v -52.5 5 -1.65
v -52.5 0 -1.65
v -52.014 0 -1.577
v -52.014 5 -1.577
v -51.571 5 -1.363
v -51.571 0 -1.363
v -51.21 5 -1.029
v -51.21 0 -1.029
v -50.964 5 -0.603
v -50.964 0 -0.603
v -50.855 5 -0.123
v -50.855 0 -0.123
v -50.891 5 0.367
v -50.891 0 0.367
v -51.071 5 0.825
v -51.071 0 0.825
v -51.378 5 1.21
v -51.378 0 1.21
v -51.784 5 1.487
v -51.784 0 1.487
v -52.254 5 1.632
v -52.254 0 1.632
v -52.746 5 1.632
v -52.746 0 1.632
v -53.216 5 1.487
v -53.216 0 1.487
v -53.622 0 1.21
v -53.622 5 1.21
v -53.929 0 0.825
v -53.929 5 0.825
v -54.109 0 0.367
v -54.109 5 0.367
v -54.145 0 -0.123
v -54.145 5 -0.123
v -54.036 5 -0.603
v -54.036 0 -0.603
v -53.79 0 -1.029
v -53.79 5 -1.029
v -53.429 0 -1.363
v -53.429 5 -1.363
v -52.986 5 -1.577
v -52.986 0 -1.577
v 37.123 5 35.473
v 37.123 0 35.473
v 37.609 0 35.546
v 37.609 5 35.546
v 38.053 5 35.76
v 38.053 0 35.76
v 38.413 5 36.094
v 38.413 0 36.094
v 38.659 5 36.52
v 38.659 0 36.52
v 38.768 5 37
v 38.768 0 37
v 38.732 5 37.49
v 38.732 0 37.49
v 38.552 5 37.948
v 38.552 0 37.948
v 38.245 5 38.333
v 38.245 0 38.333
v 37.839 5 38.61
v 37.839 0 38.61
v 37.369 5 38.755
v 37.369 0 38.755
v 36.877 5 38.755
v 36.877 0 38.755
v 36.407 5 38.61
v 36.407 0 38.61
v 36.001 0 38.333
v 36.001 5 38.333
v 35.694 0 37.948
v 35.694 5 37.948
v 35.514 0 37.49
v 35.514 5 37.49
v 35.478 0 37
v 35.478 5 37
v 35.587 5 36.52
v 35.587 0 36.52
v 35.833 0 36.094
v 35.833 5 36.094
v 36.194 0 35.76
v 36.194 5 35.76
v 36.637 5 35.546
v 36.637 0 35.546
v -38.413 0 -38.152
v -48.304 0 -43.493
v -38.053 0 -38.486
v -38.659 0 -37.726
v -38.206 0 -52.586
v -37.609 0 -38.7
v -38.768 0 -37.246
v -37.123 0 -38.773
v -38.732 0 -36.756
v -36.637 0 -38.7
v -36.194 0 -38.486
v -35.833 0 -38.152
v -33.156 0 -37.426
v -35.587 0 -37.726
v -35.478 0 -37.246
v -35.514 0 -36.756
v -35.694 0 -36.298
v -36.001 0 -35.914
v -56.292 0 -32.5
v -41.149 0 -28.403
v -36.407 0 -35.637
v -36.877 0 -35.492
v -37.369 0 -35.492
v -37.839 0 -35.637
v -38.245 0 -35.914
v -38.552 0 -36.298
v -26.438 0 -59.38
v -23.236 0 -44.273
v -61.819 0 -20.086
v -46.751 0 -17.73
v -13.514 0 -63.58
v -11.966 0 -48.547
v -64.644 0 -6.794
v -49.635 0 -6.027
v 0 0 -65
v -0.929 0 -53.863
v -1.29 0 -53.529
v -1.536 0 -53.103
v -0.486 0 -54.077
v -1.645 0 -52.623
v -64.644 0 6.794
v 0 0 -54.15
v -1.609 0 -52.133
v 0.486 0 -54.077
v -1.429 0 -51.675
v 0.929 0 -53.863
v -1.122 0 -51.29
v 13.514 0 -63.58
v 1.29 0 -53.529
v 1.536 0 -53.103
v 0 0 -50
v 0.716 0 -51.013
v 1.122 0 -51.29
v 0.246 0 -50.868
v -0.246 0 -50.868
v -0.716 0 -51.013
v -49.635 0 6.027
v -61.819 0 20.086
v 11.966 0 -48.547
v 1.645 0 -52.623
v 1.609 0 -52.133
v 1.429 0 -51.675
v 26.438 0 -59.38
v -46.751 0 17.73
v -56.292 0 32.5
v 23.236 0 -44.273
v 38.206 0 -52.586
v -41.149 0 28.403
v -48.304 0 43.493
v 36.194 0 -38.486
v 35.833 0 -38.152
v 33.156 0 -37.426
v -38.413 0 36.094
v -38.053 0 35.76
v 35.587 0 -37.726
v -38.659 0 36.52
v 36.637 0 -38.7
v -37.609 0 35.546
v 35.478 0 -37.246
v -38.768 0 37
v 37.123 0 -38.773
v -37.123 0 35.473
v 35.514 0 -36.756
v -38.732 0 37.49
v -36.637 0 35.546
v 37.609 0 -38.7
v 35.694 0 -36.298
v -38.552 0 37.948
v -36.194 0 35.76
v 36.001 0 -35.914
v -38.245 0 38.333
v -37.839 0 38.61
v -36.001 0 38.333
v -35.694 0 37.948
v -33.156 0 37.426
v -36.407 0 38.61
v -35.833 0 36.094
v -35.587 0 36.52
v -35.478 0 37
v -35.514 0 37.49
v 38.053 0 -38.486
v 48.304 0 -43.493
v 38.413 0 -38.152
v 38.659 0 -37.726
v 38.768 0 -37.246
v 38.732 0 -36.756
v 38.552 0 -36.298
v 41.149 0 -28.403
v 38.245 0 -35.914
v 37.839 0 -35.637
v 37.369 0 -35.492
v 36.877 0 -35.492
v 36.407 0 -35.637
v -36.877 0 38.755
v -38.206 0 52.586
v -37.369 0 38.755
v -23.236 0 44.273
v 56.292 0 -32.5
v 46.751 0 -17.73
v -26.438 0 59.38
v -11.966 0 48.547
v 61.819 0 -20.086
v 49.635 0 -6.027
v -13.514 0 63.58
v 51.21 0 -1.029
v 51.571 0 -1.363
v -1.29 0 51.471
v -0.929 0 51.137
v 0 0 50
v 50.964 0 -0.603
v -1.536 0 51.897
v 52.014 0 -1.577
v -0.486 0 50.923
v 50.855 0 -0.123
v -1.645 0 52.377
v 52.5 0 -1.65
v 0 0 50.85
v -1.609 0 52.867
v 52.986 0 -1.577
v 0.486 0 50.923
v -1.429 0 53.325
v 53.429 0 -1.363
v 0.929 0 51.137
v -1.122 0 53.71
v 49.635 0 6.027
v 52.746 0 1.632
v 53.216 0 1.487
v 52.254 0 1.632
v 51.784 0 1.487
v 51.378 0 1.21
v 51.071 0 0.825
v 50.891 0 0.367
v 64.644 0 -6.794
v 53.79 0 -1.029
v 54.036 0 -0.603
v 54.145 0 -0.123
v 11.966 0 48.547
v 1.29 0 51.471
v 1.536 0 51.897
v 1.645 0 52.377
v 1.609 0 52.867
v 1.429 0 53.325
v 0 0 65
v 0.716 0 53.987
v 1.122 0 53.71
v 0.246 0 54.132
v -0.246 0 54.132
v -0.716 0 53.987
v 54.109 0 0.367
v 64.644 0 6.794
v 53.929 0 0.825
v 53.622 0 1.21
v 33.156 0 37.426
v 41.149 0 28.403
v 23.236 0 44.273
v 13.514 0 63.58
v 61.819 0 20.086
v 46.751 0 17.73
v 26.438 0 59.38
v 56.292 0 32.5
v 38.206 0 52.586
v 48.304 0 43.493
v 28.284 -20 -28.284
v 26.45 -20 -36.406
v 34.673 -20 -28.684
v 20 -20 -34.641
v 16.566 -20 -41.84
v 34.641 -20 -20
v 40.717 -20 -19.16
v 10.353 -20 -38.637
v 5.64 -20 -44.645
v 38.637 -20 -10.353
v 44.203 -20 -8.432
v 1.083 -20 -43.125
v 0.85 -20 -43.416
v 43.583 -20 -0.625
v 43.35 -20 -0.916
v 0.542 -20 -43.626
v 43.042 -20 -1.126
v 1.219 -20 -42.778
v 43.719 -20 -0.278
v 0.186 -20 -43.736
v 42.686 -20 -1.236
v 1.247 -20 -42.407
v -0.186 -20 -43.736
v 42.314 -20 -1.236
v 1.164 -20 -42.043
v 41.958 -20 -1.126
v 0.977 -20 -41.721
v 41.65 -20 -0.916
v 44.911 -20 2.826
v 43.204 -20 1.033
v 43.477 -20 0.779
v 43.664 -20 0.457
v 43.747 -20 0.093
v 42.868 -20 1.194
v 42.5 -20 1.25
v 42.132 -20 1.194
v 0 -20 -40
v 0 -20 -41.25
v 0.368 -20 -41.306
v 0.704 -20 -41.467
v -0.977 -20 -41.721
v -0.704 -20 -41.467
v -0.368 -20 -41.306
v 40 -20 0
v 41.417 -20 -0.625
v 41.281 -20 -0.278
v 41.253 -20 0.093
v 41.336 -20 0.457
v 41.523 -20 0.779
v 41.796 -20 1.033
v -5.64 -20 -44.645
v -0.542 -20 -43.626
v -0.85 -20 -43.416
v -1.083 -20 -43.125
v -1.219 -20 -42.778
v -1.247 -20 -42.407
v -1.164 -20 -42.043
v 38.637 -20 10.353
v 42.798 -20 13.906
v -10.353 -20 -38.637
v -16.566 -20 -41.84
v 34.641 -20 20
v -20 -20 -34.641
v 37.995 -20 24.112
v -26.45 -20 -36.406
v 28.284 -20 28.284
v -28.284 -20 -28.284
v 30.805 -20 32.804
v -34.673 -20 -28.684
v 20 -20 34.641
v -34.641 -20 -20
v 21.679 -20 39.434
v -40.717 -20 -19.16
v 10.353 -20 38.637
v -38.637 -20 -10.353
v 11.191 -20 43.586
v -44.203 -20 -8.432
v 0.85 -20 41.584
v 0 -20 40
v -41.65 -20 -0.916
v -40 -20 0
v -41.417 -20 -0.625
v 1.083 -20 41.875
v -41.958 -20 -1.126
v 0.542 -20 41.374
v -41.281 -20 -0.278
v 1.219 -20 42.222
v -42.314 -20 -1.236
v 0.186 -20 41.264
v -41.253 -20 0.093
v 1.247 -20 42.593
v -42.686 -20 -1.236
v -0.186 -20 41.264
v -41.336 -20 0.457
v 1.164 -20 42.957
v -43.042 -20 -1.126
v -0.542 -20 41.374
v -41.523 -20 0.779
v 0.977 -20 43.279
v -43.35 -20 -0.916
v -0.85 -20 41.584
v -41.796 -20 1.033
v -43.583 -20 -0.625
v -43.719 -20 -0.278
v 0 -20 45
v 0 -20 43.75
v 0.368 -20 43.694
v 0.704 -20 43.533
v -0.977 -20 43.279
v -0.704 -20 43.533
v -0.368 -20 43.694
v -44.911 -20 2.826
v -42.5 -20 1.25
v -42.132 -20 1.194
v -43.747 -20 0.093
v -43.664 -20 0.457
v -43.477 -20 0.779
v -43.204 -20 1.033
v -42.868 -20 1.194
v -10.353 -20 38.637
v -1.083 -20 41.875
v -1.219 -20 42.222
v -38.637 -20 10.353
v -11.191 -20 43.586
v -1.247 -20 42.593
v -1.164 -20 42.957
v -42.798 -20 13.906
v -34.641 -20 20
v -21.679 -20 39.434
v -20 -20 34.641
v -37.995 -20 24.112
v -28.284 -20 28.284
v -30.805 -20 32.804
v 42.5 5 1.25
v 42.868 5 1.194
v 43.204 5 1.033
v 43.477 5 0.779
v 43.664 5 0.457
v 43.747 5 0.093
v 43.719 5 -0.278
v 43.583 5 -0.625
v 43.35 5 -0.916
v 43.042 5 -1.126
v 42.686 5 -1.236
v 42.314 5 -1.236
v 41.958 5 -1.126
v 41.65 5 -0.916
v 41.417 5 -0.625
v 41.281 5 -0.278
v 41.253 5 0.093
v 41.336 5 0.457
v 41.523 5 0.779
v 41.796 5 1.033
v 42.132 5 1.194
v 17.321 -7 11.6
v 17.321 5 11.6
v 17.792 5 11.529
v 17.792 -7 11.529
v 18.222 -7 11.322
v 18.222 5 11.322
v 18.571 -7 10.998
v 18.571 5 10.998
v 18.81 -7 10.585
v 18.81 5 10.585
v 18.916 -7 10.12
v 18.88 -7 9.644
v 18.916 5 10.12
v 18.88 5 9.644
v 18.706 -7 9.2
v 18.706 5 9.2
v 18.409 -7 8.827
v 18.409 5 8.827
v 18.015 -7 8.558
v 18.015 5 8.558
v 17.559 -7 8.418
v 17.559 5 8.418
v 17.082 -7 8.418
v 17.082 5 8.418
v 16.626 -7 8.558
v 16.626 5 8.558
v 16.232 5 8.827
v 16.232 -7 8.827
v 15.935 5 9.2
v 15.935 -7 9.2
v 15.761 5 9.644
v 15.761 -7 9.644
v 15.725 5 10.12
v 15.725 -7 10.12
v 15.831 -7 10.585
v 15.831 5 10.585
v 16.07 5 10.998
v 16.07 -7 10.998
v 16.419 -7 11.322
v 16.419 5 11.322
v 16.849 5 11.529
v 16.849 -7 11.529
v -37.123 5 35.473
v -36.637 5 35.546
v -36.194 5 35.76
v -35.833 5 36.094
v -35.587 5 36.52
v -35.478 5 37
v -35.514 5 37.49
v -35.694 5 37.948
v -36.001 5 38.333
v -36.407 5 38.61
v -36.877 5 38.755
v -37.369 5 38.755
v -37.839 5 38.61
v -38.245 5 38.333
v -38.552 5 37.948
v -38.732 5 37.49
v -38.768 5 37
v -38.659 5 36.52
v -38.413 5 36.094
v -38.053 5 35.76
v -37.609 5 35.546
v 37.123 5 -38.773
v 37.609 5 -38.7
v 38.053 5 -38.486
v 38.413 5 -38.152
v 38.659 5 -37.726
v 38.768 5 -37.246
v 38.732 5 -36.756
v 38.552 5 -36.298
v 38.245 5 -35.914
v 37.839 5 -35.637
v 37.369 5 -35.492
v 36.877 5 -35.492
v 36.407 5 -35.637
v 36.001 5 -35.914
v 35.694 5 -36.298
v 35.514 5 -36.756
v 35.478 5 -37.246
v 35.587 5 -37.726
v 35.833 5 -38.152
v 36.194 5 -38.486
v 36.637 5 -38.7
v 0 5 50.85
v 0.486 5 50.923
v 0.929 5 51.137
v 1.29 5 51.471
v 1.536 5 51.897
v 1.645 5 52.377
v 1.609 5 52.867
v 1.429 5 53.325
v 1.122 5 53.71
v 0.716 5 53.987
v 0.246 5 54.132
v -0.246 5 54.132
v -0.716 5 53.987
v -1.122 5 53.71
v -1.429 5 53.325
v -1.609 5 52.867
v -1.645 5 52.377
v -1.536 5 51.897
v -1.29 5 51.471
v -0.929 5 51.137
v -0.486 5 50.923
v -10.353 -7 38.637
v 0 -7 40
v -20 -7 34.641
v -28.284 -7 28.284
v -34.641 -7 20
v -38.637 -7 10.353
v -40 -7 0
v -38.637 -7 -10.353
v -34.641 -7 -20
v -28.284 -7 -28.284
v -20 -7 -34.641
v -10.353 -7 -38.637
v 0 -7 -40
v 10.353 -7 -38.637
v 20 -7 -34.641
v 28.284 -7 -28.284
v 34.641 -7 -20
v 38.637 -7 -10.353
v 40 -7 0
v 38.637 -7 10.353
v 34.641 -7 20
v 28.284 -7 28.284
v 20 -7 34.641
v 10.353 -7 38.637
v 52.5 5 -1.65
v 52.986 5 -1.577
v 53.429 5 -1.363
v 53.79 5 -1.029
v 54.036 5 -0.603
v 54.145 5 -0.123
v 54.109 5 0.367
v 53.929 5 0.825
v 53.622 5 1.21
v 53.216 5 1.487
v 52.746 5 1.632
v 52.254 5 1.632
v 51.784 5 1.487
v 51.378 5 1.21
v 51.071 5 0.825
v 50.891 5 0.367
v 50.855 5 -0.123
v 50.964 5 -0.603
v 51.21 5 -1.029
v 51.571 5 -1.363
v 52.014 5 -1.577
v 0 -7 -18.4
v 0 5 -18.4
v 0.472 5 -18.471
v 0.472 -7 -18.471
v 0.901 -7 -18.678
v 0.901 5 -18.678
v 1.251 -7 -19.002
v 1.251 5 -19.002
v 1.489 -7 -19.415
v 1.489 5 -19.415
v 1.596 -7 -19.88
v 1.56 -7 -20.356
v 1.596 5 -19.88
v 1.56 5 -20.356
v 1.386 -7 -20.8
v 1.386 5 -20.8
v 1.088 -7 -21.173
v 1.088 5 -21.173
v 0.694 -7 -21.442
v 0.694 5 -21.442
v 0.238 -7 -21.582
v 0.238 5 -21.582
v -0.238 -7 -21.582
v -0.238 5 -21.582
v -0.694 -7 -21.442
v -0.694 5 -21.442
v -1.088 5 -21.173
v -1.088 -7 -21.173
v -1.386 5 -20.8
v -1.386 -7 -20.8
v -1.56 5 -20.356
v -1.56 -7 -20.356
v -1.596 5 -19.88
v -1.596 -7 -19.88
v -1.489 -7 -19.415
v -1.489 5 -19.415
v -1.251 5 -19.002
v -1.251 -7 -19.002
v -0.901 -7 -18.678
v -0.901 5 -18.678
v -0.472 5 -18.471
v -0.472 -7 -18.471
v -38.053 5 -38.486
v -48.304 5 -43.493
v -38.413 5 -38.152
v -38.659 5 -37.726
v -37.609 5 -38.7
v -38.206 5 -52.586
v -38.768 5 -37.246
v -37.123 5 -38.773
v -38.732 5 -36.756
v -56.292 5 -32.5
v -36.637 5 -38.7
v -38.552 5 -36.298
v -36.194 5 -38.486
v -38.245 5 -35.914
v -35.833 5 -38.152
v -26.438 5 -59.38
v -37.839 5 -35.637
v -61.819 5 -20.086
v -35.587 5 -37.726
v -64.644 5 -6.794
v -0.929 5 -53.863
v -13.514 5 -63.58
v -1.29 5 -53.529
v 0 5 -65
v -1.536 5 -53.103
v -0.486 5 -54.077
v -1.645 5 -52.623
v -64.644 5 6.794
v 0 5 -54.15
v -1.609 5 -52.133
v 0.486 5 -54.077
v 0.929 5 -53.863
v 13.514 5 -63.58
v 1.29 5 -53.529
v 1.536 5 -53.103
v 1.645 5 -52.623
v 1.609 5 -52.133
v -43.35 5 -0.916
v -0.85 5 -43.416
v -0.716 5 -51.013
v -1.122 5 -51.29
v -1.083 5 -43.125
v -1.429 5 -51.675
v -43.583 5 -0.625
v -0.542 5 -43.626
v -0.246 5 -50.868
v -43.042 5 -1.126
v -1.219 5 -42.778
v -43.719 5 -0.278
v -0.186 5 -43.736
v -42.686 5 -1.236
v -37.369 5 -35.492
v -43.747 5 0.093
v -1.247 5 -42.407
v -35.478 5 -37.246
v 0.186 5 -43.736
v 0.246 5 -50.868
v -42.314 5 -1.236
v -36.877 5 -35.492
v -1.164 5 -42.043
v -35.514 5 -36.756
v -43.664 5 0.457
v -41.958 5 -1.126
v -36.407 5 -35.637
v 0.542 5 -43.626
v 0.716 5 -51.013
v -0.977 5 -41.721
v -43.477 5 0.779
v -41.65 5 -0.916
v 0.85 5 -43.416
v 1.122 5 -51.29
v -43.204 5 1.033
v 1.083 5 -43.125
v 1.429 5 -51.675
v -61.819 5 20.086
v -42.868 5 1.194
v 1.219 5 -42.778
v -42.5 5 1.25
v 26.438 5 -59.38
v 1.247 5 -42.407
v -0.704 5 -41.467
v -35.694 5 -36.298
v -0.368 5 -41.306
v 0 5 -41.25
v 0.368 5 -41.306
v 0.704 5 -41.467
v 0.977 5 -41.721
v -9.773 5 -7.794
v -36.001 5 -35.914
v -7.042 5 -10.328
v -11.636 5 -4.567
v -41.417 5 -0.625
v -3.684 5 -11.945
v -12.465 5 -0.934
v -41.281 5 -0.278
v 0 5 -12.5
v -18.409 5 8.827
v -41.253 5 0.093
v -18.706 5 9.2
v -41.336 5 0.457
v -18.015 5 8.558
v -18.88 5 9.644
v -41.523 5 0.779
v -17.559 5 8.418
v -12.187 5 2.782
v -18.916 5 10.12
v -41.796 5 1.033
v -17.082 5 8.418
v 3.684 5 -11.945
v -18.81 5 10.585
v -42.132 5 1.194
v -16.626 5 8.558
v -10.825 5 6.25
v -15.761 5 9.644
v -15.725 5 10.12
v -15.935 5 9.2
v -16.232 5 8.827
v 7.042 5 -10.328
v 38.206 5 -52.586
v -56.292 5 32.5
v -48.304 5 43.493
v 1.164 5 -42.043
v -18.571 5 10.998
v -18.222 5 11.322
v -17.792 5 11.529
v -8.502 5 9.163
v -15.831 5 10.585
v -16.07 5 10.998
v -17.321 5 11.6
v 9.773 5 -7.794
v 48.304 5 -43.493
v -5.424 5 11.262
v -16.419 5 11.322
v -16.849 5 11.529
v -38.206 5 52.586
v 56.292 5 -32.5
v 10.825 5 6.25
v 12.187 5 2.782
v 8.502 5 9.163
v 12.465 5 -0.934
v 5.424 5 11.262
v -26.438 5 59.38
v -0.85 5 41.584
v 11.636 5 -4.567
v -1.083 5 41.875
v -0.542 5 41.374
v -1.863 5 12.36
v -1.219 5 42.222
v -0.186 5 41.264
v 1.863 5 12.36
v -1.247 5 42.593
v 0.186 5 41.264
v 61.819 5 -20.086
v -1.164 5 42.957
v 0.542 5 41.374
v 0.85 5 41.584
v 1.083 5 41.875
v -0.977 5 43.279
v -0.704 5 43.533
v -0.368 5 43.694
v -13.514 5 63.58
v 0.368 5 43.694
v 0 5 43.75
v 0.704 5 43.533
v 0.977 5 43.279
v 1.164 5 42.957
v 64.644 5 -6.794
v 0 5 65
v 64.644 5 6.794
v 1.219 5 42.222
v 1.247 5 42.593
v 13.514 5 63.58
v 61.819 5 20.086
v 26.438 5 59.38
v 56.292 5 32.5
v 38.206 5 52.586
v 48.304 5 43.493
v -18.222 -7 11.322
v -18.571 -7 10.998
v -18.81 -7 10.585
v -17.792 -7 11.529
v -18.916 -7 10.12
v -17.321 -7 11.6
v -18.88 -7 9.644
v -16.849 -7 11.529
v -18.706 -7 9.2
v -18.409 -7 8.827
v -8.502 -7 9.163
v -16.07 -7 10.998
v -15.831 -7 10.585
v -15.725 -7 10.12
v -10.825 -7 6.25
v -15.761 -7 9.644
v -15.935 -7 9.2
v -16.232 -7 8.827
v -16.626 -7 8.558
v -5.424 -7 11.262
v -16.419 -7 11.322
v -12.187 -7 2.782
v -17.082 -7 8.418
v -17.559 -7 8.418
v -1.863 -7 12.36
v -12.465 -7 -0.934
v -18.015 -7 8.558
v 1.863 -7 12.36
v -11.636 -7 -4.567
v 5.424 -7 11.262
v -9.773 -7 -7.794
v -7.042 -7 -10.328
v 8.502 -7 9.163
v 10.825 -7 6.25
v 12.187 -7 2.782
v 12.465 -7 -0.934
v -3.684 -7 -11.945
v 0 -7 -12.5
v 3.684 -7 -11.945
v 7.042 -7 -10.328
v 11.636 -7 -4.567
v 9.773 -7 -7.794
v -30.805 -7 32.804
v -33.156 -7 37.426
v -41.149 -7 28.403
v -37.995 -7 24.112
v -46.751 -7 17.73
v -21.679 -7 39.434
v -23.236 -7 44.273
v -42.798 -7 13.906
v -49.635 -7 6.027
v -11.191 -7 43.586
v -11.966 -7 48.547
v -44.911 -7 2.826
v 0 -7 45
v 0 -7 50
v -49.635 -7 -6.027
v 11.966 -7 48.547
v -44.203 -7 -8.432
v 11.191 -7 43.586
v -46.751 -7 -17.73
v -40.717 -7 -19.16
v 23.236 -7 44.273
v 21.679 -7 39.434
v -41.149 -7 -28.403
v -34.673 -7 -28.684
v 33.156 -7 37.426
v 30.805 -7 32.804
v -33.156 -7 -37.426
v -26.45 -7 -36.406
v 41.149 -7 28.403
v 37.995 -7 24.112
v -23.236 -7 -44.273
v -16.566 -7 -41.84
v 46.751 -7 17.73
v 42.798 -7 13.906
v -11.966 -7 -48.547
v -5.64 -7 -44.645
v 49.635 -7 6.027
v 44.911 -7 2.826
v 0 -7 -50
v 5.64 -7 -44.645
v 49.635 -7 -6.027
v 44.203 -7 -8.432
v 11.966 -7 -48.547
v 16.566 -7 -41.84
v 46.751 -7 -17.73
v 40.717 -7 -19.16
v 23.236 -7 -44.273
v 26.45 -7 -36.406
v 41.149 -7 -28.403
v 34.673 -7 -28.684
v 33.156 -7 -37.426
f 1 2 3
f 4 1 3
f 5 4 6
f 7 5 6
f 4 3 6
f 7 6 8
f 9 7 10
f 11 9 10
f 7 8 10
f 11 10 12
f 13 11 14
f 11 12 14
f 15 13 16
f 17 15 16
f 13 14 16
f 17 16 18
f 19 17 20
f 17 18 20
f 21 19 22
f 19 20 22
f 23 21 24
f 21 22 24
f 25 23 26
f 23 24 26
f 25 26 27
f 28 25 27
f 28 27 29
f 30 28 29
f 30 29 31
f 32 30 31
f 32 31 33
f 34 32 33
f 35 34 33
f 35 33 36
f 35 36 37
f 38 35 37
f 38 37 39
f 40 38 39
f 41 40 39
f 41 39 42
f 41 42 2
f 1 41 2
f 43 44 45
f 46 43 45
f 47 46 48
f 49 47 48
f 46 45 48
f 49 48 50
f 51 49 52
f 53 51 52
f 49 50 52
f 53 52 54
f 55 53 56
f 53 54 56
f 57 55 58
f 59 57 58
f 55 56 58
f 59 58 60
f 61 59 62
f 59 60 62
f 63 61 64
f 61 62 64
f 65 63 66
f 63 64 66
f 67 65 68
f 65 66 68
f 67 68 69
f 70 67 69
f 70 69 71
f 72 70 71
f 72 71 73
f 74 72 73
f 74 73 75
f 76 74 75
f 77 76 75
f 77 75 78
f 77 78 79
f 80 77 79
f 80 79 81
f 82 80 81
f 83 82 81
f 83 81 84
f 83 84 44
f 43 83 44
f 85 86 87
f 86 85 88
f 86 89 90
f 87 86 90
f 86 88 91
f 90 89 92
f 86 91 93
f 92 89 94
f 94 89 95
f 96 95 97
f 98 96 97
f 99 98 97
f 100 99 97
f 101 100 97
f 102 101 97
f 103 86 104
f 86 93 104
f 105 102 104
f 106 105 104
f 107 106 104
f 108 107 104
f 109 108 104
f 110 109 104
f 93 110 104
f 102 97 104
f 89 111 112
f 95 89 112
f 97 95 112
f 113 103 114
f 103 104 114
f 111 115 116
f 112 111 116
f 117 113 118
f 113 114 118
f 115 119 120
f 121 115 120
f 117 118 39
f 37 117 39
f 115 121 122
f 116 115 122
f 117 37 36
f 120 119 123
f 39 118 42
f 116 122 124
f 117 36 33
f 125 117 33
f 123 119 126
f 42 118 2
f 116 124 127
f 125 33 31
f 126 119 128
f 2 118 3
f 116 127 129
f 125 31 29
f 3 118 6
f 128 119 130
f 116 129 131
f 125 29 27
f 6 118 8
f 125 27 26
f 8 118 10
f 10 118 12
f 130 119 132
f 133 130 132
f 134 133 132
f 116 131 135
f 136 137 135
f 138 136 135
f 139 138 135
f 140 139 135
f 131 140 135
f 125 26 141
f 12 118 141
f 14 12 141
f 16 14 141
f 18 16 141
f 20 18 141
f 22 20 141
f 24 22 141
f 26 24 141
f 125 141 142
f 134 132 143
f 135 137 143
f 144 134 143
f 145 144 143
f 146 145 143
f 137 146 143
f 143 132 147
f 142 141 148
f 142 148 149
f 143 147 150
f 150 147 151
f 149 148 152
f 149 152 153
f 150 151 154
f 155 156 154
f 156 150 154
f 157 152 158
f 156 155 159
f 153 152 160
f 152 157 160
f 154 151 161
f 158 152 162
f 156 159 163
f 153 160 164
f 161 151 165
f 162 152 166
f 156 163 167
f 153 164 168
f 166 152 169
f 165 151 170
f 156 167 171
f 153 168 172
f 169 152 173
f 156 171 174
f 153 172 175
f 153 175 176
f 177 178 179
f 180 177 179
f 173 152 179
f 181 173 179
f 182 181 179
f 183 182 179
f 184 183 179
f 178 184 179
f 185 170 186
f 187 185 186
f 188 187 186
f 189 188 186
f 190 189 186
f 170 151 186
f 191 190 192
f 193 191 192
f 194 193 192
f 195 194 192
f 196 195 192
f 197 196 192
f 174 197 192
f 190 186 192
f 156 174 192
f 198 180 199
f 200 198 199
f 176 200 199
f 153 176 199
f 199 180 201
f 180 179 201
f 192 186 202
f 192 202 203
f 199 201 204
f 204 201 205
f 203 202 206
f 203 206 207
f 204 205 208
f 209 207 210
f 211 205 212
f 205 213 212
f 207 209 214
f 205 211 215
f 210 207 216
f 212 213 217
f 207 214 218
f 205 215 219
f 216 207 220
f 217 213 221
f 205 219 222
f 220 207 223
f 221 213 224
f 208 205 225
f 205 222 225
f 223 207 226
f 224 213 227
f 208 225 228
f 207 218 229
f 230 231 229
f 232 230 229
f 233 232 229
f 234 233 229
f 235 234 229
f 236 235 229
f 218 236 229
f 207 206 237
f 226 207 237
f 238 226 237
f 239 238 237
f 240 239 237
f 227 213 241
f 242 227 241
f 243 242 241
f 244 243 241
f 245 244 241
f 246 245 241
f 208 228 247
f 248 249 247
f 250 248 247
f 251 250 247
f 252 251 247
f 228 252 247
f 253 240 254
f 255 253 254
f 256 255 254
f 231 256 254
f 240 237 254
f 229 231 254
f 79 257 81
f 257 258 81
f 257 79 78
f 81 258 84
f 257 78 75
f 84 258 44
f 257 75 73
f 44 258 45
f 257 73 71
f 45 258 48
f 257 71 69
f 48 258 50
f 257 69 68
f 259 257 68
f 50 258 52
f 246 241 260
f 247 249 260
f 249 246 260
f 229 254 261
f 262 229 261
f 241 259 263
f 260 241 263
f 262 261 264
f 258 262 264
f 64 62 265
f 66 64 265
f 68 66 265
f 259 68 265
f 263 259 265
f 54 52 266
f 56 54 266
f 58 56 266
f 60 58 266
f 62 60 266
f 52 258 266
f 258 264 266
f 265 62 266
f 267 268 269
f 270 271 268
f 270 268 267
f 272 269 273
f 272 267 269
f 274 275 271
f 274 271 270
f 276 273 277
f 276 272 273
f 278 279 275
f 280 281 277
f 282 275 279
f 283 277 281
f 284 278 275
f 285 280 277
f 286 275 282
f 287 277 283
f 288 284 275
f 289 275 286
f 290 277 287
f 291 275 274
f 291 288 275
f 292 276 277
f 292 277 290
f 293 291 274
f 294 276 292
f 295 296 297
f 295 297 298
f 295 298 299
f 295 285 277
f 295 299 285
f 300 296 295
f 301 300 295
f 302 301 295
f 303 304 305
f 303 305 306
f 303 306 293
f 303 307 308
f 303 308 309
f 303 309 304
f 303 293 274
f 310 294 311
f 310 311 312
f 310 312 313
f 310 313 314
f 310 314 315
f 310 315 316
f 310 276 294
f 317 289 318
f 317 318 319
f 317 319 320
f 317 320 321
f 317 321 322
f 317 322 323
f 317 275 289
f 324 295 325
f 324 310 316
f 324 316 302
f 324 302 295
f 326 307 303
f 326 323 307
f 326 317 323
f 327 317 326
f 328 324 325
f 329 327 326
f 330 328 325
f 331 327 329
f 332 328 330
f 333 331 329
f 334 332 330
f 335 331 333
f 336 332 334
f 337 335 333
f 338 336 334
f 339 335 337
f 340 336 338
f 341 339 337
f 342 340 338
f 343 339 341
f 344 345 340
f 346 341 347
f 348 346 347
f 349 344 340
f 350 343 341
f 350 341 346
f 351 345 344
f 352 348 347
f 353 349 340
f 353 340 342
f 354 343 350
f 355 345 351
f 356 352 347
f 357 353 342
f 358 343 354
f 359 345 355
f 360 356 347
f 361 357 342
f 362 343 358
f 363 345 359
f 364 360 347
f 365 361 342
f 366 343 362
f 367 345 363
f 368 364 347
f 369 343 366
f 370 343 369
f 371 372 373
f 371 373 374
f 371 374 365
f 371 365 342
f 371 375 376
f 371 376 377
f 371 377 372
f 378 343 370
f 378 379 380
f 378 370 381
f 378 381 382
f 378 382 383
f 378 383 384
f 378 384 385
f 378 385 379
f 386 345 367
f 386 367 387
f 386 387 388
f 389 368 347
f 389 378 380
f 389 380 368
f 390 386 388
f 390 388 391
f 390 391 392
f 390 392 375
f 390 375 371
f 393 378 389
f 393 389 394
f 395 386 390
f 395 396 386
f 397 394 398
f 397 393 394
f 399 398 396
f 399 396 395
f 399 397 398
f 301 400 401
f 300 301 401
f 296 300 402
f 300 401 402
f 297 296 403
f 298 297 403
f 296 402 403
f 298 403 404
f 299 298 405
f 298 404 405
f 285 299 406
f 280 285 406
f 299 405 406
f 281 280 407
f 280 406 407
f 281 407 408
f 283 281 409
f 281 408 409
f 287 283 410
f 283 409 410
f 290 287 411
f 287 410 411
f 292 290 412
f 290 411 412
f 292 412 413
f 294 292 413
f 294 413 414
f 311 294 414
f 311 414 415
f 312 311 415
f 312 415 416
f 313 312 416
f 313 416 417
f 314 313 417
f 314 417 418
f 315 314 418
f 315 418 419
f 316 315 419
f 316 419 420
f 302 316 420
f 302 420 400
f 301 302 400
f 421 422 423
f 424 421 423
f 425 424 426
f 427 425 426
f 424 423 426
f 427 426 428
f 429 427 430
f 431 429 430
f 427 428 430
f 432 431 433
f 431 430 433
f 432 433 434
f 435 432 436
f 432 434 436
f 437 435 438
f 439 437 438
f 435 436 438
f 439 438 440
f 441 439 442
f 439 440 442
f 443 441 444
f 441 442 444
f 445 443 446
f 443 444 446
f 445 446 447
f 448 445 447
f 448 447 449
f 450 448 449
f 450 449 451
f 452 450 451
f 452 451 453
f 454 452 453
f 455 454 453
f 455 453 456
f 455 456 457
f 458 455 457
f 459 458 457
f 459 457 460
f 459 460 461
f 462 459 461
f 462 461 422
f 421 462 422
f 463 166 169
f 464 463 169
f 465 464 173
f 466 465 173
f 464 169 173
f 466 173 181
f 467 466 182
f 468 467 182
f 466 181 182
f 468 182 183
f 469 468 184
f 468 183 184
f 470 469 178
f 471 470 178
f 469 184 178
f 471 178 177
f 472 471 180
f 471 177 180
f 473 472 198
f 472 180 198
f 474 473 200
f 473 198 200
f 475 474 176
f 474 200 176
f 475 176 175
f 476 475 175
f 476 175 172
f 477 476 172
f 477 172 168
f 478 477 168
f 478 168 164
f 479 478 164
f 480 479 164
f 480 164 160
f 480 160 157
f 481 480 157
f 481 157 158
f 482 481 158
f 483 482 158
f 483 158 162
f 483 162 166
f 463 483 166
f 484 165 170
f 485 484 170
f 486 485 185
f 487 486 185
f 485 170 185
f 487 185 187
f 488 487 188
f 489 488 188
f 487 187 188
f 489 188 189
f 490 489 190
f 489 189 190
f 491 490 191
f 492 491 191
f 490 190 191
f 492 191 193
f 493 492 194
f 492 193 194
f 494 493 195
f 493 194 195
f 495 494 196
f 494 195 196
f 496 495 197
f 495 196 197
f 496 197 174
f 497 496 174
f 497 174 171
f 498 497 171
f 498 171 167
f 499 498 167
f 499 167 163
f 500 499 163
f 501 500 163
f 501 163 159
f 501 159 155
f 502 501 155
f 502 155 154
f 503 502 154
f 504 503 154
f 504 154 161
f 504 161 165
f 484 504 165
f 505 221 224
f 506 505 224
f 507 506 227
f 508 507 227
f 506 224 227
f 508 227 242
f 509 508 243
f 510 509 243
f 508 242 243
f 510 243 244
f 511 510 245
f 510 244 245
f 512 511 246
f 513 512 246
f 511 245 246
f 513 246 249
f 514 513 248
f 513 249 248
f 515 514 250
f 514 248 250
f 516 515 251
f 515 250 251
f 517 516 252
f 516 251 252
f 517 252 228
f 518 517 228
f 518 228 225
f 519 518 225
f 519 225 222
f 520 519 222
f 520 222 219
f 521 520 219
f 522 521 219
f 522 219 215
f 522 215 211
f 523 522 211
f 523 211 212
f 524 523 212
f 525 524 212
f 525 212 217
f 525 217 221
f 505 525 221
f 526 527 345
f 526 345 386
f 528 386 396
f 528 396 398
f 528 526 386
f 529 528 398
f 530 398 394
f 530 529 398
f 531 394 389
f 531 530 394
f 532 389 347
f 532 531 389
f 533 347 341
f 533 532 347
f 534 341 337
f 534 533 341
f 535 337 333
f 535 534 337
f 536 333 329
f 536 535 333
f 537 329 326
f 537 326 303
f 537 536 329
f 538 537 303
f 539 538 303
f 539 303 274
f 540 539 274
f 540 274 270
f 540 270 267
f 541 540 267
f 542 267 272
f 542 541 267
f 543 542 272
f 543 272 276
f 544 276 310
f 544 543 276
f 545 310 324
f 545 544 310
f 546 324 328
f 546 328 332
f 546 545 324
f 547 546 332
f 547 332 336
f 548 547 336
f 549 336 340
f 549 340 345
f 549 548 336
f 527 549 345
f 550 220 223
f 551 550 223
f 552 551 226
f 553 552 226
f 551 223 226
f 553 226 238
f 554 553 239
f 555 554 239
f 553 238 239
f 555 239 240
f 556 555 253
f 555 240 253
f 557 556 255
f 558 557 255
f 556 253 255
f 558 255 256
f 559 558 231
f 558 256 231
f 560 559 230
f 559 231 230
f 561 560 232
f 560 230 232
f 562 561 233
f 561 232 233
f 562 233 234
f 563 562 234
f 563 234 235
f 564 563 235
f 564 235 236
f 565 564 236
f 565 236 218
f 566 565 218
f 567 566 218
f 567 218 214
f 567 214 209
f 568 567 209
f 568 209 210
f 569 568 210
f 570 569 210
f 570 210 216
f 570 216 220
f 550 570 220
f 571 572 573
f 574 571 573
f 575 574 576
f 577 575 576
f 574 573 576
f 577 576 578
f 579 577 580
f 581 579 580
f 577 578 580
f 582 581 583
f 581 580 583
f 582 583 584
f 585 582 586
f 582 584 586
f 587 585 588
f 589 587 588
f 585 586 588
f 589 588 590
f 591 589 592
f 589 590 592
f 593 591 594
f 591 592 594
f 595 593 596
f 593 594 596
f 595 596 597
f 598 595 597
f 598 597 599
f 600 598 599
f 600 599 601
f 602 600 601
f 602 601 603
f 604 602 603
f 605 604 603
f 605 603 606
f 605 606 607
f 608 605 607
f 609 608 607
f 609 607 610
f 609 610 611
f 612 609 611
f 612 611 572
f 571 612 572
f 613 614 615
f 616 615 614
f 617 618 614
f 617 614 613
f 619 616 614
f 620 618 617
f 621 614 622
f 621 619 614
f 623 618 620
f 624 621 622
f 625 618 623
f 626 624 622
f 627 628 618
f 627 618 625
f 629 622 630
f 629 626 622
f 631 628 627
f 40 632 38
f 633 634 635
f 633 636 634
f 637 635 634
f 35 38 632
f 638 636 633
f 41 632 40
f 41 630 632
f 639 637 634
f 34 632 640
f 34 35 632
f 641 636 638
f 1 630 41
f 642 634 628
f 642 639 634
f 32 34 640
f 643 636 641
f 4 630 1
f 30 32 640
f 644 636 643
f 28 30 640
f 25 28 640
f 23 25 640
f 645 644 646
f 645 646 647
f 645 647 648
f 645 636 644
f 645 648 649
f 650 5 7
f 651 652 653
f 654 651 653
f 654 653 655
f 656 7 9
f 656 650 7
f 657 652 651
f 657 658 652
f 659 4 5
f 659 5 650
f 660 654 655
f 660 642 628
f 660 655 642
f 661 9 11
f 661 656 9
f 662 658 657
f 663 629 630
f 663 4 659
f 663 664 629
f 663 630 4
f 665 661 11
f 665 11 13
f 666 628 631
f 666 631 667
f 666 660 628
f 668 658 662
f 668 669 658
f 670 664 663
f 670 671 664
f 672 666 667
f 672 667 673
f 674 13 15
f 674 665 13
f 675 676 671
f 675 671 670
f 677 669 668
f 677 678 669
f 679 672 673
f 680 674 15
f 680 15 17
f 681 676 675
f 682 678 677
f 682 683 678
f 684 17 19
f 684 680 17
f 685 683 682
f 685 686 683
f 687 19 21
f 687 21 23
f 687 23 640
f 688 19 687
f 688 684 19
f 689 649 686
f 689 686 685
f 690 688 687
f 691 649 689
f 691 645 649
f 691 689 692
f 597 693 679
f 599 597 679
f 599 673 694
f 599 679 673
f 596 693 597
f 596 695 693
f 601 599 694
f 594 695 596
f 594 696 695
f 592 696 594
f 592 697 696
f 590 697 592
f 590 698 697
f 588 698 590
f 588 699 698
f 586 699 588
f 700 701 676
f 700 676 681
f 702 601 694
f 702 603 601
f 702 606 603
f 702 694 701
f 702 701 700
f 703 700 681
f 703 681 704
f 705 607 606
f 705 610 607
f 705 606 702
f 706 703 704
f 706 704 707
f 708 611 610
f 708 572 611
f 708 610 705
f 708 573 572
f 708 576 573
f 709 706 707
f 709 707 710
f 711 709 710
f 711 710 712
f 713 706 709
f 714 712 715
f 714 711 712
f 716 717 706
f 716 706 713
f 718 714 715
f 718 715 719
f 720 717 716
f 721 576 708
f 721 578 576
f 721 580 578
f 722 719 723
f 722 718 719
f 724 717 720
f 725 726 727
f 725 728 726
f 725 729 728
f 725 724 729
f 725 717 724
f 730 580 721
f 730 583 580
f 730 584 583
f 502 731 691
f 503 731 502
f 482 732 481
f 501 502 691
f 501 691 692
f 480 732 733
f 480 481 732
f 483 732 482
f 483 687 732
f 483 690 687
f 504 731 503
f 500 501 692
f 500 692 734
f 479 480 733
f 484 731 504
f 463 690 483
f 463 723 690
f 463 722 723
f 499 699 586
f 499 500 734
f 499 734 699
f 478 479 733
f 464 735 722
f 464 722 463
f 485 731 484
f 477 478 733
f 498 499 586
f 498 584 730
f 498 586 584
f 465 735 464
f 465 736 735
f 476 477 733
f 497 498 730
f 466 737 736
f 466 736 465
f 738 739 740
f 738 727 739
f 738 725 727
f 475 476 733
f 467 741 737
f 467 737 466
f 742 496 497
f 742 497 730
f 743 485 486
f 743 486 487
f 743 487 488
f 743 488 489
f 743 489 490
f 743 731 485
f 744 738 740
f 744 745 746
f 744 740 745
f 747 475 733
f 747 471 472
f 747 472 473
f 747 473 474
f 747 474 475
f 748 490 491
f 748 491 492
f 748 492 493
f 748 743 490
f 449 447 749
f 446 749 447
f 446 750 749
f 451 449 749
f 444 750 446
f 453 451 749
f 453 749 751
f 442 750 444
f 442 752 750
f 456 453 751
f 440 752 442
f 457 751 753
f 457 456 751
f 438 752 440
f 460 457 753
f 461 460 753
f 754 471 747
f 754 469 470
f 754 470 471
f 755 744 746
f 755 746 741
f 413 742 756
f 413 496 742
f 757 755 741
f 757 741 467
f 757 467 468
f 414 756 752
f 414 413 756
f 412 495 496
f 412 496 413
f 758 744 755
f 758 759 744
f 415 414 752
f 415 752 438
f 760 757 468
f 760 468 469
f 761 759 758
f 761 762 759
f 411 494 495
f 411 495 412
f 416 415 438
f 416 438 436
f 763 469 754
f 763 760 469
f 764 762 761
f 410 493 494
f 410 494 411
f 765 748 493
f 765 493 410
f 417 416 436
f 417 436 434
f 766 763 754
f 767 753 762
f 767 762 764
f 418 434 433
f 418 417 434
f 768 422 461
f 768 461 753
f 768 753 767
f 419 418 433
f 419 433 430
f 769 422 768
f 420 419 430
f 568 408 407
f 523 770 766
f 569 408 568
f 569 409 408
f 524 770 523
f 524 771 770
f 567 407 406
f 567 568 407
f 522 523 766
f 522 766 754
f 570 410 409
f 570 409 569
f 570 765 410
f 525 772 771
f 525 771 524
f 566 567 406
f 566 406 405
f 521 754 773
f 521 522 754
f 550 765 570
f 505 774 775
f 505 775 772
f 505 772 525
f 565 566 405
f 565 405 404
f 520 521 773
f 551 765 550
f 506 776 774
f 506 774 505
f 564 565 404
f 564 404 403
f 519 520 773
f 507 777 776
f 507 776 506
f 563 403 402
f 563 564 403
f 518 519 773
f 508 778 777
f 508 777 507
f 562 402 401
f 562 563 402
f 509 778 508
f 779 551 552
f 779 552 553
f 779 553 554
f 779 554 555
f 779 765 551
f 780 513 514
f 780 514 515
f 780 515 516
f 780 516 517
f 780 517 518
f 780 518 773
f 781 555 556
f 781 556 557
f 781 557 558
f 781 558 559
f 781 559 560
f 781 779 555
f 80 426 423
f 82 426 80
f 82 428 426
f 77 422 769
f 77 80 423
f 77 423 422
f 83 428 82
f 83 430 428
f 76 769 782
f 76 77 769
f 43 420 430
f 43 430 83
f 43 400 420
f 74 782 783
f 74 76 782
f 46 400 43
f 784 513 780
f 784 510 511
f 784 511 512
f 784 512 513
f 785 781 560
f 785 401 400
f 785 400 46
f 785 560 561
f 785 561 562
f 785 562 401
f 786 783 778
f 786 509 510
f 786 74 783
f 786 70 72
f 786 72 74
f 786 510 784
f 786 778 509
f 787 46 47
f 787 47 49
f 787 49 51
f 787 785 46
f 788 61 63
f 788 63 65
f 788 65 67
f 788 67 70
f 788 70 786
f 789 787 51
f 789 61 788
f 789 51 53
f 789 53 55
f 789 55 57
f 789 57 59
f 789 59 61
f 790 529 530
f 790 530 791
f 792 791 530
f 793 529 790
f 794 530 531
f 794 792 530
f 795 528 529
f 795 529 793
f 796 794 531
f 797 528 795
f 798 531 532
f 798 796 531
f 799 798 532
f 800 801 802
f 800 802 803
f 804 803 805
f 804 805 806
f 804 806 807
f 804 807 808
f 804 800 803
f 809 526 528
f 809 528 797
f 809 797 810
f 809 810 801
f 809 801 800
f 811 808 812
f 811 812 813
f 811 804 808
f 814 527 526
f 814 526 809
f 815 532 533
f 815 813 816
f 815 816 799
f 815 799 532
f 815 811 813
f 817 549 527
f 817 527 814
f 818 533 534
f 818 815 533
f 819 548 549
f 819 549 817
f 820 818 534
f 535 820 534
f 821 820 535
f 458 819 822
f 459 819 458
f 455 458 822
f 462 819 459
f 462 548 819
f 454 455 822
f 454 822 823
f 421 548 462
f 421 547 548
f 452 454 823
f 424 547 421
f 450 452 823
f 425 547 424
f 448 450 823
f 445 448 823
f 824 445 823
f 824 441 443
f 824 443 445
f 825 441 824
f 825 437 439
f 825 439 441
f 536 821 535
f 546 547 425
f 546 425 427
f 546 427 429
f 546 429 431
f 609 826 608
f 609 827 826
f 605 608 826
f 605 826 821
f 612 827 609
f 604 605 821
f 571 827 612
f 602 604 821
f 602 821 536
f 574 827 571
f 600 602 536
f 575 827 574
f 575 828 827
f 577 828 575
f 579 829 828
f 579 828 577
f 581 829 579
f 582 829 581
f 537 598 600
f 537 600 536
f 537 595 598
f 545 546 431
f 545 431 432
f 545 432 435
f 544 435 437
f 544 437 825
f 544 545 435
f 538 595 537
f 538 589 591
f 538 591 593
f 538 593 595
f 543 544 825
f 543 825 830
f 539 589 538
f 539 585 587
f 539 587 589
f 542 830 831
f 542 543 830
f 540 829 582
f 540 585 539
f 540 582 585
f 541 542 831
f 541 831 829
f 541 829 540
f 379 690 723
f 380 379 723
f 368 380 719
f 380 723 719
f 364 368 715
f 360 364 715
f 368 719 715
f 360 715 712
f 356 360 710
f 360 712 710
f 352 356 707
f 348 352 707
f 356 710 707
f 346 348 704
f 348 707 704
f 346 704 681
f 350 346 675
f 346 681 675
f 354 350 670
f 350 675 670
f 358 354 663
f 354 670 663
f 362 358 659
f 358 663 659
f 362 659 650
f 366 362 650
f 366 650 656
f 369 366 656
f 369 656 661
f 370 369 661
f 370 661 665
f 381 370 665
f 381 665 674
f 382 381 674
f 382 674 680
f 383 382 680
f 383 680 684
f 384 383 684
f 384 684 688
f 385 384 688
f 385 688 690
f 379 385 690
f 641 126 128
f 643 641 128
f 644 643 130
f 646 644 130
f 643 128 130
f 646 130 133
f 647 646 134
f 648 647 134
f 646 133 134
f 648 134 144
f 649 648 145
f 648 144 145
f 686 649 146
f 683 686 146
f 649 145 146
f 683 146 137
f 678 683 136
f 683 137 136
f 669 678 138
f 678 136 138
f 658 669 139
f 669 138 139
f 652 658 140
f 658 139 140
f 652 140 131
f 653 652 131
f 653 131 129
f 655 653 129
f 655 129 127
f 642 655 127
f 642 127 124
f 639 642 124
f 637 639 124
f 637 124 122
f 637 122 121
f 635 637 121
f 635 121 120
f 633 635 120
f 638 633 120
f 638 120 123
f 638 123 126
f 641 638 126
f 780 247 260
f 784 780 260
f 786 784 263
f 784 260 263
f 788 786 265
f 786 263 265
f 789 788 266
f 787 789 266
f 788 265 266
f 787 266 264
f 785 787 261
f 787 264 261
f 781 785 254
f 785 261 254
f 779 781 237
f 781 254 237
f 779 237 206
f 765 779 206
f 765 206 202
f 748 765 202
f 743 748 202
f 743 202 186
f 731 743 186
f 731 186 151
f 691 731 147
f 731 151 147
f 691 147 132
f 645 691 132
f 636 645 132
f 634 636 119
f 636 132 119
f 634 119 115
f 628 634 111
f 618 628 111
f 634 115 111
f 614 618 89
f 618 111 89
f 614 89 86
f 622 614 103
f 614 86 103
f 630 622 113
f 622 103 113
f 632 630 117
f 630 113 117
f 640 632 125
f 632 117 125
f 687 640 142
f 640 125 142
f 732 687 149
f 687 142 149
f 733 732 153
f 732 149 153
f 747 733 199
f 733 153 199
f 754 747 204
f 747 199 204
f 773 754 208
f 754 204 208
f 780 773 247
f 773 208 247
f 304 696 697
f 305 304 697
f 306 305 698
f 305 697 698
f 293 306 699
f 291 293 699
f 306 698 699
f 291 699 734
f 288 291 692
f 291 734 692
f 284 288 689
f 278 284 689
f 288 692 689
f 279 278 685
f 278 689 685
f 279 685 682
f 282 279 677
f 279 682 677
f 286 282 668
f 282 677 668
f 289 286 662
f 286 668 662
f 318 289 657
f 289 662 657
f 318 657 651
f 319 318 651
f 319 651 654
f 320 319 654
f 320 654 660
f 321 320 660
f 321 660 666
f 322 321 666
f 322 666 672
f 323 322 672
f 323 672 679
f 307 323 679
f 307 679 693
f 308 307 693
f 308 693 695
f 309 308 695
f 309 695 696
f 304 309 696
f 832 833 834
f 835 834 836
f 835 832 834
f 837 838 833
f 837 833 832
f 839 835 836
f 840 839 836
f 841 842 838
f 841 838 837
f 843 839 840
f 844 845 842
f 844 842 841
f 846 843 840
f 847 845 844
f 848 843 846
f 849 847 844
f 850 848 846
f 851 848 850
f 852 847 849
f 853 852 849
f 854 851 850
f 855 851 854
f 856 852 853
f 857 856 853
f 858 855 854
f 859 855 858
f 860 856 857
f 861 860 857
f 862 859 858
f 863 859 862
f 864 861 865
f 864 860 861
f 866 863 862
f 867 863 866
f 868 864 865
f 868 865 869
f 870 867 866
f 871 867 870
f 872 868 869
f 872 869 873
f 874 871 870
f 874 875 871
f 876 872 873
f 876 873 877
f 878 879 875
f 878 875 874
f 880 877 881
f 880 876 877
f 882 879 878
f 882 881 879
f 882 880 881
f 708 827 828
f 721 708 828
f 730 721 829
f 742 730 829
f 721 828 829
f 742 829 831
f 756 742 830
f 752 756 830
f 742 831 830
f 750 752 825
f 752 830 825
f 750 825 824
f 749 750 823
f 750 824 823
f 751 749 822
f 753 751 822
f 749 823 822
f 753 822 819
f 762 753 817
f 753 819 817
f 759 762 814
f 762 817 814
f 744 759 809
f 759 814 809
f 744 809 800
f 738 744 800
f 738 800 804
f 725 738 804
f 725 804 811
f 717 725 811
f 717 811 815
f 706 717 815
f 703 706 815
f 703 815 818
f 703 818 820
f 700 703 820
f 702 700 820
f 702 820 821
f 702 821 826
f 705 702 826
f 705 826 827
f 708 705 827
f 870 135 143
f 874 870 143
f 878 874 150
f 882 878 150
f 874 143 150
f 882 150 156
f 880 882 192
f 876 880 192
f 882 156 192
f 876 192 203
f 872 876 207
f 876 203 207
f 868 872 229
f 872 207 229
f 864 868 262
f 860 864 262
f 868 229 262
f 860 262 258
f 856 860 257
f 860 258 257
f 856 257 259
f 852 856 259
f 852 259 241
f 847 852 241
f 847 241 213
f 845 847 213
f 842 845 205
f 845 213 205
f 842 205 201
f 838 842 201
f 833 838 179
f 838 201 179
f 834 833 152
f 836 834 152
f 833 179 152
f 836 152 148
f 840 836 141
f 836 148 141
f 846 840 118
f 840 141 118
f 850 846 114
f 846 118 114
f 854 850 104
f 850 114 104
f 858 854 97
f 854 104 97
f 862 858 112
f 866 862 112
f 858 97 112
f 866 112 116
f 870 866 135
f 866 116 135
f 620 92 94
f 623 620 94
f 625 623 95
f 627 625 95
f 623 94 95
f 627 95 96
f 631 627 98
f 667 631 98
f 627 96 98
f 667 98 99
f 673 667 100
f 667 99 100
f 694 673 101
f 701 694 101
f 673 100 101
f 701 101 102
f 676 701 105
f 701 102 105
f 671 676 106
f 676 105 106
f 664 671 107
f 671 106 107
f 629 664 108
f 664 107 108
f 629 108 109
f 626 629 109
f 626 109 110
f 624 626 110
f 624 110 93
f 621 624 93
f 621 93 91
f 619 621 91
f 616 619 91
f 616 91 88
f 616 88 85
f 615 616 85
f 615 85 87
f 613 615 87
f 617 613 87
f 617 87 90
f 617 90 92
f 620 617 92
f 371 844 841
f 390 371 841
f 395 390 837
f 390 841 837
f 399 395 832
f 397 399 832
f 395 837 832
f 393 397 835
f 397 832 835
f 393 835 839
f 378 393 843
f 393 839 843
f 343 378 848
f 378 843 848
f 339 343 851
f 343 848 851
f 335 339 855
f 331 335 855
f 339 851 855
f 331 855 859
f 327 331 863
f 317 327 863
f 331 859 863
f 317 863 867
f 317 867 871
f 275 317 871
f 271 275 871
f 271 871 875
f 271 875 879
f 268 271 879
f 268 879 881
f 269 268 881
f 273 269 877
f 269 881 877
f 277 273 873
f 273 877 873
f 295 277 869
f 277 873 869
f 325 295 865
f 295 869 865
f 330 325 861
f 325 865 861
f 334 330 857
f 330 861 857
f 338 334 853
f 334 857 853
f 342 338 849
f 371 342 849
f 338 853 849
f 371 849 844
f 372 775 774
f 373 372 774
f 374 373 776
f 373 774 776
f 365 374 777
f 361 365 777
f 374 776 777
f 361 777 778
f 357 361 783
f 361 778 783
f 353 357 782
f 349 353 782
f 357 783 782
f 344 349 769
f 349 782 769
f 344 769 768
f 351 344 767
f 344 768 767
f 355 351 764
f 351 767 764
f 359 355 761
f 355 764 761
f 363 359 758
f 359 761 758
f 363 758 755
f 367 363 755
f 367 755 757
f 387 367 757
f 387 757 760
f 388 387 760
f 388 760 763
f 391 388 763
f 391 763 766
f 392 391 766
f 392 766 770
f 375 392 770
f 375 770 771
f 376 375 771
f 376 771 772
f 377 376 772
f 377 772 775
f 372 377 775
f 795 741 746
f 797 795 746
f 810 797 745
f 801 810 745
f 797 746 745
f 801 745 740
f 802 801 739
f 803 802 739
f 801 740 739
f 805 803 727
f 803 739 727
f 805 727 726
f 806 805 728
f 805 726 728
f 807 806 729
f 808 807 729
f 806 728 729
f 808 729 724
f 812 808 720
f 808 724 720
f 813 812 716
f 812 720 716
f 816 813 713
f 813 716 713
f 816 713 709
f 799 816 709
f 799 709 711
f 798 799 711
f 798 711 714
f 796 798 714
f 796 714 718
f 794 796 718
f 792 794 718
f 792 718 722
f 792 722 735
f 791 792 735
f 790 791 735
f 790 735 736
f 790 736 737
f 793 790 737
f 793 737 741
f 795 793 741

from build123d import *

# Parameters (mm, degrees)
SKETCH_1_R             = 65
EXTRUDE_1_DEPTH        = 5
SKETCH_2_R             = 50
EXTRUDE_2_DEPTH        = 7
SKETCH_3_R             = 1.6
CUT_EXTRUDE_1_DEPTH    = 58
SKETCH_4_R             = 12.5
CUT_EXTRUDE_2_DEPTH    = 93.703829479
SKETCH_5_R             = 45
SKETCH_5_R_2           = 40
EXTRUDE_3_DEPTH        = 13
HOLE_WIZARD_M3_1_D     = 2.5
SKETCH_9_R             = 1.6
CUT_EXTRUDE_3_DEPTH    = 10
HOLE_WIZARD_M4_3_D     = 3.3
HOLE_WIZARD_M4_3_DEPTH = 9.5
HOLE_WIZARD_M4_3_TIP   = 0.991420021


with BuildPart() as part:
    # 草图1 → 凸台-拉伸1 (new body)
    with BuildSketch(Plane(origin=(0, 0, 0), x_dir=(1, 0, 0), z_dir=(0, 1, 0))):
        with Locations(Location((0, 0, 0), (0, 0, 270))):
            Circle(SKETCH_1_R)
    extrude(amount=EXTRUDE_1_DEPTH)

    # 草图2 → 凸台-拉伸2 (add)
    with BuildSketch(Plane(origin=(0, 0, 0), x_dir=(-1, 0, 0), z_dir=(0, -1, 0))):
        with Locations(Location((0, 0, 0), (0, 0, 90))):
            Circle(SKETCH_2_R)
    extrude(amount=EXTRUDE_2_DEPTH)

    # 草图3 → 切除-拉伸1 (cut)
    with BuildSketch(Plane(origin=(0, 5, 0), x_dir=(1, 0, 0), z_dir=(0, 1, 0))):
        with Locations(Location((0, 20, 0), (0, 0, 270))):
            Circle(SKETCH_3_R)
        with Locations(Location((17.320508076, -10, 0), (0, 0, 270))):
            Circle(SKETCH_3_R)
        with Locations(Location((-17.320508076, -10, 0), (0, 0, 270))):
            Circle(SKETCH_3_R)
    extrude(amount=-CUT_EXTRUDE_1_DEPTH, mode=Mode.SUBTRACT)

    # 草图4 → 切除-拉伸2 (cut, through all)
    with BuildSketch(Plane(origin=(0, -7, 0), x_dir=(-1, 0, 0), z_dir=(0, -1, 0))):
        with Locations(Location((0, 0, 0), (0, 0, 90))):
            Circle(SKETCH_4_R)
    extrude(amount=-CUT_EXTRUDE_2_DEPTH, mode=Mode.SUBTRACT)

    # 草图5 → 凸台-拉伸3 (add)
    with BuildSketch(Plane(origin=(0, -7, 0), x_dir=(-1, 0, 0), z_dir=(0, -1, 0))):
        with Locations(Location((0, 0, 0), (0, 0, 270))):
            Circle(SKETCH_5_R)
        with Locations(Location((0, 0, 0), (0, 0, 270))):
            Circle(SKETCH_5_R_2, mode=Mode.SUBTRACT)
    extrude(amount=EXTRUDE_3_DEPTH)

    # M3 螺纹孔1 (through all)
    with Locations(Plane(origin=(0, -20, 42.5), x_dir=(0, 0, -1), z_dir=(0, -1, 0))):
        with Locations((0, 0), (42.5, -42.5), (85, 0), (42.5, 42.5)):
            Hole(HOLE_WIZARD_M3_1_D / 2)

    # 草图9 → 切除-拉伸3 (cut)
    with BuildSketch(Plane(origin=(0, 5, 0), x_dir=(1, 0, 0), z_dir=(0, 1, 0))):
        with Locations(Location((0, 52.5, 0), (0, 0, 270))):
            Circle(SKETCH_9_R)
        with Locations(Location((37.123106012, 37.123106012, 0), (0, 0, 270))):
            Circle(SKETCH_9_R)
        with Locations(Location((52.5, 0, 0), (0, 0, 270))):
            Circle(SKETCH_9_R)
        with Locations(Location((37.123106012, -37.123106012, 0), (0, 0, 270))):
            Circle(SKETCH_9_R)
        with Locations(Location((0, -52.5, 0), (0, 0, 270))):
            Circle(SKETCH_9_R)
        with Locations(Location((-37.123106012, -37.123106012, 0), (0, 0, 270))):
            Circle(SKETCH_9_R)
        with Locations(Location((-52.5, 0, 0), (0, 0, 270))):
            Circle(SKETCH_9_R)
        with Locations(Location((-37.123106012, 37.123106012, 0), (0, 0, 270))):
            Circle(SKETCH_9_R)
    extrude(amount=-CUT_EXTRUDE_3_DEPTH, mode=Mode.SUBTRACT)

    # M4 螺纹孔3
    with Locations(Plane(origin=(0, 5, -52.5), x_dir=(0, 0, 1), z_dir=(0, 1, 0))):
        with Locations((0, 0), (15.376893988, 37.123106012), (52.5, 52.5), (89.623106012, 37.123106012), (105, 0), (89.623106012, -37.123106012), (52.5, -52.5), (15.376893988, -37.123106012)):
            Hole(HOLE_WIZARD_M4_3_D / 2, depth=HOLE_WIZARD_M4_3_DEPTH)
            with Locations((0, 0, -(HOLE_WIZARD_M4_3_DEPTH + HOLE_WIZARD_M4_3_TIP / 2))):  # 118° drill point
                Cone(0, HOLE_WIZARD_M4_3_D / 2, HOLE_WIZARD_M4_3_TIP, mode=Mode.SUBTRACT)


solid = part.part
